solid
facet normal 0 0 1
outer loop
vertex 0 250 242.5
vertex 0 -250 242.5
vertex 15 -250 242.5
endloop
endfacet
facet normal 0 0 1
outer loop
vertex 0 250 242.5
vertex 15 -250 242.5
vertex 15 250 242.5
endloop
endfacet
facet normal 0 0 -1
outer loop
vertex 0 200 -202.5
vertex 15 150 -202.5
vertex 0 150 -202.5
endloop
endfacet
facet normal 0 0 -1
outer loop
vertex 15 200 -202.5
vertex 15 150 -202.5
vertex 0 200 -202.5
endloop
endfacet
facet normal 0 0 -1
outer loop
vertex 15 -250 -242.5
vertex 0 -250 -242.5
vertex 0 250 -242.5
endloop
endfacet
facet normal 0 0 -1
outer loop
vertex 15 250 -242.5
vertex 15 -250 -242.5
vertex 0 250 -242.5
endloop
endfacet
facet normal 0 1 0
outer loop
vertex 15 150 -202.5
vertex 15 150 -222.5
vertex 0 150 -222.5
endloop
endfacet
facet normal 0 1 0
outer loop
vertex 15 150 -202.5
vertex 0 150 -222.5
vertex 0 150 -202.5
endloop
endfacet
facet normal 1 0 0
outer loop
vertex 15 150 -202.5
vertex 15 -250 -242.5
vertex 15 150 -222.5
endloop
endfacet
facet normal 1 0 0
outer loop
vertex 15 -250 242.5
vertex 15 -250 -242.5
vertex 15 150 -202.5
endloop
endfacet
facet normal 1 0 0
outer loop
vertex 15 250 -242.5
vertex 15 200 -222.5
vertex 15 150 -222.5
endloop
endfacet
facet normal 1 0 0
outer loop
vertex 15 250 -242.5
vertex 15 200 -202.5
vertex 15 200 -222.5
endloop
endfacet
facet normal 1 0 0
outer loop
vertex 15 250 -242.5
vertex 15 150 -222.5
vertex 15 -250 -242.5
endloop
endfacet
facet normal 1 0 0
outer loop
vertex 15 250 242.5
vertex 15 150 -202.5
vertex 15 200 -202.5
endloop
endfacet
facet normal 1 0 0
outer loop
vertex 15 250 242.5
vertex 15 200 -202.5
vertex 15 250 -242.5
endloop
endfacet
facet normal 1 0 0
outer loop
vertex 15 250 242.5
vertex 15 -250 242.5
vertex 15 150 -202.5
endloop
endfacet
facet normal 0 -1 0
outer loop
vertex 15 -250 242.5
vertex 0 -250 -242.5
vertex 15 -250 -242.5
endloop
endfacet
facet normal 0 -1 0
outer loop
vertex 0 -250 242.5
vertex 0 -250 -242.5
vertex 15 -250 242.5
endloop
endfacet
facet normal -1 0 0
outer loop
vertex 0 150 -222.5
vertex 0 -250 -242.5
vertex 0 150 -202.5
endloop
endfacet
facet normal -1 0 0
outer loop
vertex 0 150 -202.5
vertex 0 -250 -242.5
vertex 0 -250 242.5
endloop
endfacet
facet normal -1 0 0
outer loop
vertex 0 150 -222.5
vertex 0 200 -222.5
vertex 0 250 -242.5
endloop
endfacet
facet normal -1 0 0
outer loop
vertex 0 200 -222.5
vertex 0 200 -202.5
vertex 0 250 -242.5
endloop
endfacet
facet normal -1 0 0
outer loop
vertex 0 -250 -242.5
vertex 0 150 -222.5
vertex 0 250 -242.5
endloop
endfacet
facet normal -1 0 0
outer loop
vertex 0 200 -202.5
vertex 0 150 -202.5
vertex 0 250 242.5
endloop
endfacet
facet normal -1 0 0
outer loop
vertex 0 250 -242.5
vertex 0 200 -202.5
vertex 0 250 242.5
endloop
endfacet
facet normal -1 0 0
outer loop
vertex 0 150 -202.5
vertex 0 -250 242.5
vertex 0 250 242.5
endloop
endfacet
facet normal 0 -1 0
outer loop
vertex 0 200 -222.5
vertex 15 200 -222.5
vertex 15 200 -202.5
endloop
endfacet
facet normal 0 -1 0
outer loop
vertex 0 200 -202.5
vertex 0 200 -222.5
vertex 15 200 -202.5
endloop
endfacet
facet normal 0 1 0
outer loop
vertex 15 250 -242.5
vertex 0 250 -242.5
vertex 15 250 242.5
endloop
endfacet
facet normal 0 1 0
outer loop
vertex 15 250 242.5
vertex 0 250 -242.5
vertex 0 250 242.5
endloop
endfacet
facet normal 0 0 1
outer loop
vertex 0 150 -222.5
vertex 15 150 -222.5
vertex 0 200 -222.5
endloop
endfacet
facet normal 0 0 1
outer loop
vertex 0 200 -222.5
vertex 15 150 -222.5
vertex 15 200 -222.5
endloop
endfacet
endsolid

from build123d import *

# Parameters (mm, degrees)
F0_W     = 500
F0_H     = 485
F1_DEPTH = 15
F2_W     = 50
F2_H     = 20
F3_DEPTH = 15.001


with BuildPart() as f1:
    # F0 (on Right) → F1 (new body)
    with BuildSketch(Plane.YZ):
        Rectangle(F0_W, F0_H)
    extrude(amount=F1_DEPTH)

    # F2 (on face) → F3 (cut, through all)
    with BuildSketch(Plane.YZ.offset(15)):
        with Locations((175, -212.5)):
            Rectangle(F2_W, F2_H)
    extrude(amount=-F3_DEPTH, mode=Mode.SUBTRACT)


solid = f1.part
